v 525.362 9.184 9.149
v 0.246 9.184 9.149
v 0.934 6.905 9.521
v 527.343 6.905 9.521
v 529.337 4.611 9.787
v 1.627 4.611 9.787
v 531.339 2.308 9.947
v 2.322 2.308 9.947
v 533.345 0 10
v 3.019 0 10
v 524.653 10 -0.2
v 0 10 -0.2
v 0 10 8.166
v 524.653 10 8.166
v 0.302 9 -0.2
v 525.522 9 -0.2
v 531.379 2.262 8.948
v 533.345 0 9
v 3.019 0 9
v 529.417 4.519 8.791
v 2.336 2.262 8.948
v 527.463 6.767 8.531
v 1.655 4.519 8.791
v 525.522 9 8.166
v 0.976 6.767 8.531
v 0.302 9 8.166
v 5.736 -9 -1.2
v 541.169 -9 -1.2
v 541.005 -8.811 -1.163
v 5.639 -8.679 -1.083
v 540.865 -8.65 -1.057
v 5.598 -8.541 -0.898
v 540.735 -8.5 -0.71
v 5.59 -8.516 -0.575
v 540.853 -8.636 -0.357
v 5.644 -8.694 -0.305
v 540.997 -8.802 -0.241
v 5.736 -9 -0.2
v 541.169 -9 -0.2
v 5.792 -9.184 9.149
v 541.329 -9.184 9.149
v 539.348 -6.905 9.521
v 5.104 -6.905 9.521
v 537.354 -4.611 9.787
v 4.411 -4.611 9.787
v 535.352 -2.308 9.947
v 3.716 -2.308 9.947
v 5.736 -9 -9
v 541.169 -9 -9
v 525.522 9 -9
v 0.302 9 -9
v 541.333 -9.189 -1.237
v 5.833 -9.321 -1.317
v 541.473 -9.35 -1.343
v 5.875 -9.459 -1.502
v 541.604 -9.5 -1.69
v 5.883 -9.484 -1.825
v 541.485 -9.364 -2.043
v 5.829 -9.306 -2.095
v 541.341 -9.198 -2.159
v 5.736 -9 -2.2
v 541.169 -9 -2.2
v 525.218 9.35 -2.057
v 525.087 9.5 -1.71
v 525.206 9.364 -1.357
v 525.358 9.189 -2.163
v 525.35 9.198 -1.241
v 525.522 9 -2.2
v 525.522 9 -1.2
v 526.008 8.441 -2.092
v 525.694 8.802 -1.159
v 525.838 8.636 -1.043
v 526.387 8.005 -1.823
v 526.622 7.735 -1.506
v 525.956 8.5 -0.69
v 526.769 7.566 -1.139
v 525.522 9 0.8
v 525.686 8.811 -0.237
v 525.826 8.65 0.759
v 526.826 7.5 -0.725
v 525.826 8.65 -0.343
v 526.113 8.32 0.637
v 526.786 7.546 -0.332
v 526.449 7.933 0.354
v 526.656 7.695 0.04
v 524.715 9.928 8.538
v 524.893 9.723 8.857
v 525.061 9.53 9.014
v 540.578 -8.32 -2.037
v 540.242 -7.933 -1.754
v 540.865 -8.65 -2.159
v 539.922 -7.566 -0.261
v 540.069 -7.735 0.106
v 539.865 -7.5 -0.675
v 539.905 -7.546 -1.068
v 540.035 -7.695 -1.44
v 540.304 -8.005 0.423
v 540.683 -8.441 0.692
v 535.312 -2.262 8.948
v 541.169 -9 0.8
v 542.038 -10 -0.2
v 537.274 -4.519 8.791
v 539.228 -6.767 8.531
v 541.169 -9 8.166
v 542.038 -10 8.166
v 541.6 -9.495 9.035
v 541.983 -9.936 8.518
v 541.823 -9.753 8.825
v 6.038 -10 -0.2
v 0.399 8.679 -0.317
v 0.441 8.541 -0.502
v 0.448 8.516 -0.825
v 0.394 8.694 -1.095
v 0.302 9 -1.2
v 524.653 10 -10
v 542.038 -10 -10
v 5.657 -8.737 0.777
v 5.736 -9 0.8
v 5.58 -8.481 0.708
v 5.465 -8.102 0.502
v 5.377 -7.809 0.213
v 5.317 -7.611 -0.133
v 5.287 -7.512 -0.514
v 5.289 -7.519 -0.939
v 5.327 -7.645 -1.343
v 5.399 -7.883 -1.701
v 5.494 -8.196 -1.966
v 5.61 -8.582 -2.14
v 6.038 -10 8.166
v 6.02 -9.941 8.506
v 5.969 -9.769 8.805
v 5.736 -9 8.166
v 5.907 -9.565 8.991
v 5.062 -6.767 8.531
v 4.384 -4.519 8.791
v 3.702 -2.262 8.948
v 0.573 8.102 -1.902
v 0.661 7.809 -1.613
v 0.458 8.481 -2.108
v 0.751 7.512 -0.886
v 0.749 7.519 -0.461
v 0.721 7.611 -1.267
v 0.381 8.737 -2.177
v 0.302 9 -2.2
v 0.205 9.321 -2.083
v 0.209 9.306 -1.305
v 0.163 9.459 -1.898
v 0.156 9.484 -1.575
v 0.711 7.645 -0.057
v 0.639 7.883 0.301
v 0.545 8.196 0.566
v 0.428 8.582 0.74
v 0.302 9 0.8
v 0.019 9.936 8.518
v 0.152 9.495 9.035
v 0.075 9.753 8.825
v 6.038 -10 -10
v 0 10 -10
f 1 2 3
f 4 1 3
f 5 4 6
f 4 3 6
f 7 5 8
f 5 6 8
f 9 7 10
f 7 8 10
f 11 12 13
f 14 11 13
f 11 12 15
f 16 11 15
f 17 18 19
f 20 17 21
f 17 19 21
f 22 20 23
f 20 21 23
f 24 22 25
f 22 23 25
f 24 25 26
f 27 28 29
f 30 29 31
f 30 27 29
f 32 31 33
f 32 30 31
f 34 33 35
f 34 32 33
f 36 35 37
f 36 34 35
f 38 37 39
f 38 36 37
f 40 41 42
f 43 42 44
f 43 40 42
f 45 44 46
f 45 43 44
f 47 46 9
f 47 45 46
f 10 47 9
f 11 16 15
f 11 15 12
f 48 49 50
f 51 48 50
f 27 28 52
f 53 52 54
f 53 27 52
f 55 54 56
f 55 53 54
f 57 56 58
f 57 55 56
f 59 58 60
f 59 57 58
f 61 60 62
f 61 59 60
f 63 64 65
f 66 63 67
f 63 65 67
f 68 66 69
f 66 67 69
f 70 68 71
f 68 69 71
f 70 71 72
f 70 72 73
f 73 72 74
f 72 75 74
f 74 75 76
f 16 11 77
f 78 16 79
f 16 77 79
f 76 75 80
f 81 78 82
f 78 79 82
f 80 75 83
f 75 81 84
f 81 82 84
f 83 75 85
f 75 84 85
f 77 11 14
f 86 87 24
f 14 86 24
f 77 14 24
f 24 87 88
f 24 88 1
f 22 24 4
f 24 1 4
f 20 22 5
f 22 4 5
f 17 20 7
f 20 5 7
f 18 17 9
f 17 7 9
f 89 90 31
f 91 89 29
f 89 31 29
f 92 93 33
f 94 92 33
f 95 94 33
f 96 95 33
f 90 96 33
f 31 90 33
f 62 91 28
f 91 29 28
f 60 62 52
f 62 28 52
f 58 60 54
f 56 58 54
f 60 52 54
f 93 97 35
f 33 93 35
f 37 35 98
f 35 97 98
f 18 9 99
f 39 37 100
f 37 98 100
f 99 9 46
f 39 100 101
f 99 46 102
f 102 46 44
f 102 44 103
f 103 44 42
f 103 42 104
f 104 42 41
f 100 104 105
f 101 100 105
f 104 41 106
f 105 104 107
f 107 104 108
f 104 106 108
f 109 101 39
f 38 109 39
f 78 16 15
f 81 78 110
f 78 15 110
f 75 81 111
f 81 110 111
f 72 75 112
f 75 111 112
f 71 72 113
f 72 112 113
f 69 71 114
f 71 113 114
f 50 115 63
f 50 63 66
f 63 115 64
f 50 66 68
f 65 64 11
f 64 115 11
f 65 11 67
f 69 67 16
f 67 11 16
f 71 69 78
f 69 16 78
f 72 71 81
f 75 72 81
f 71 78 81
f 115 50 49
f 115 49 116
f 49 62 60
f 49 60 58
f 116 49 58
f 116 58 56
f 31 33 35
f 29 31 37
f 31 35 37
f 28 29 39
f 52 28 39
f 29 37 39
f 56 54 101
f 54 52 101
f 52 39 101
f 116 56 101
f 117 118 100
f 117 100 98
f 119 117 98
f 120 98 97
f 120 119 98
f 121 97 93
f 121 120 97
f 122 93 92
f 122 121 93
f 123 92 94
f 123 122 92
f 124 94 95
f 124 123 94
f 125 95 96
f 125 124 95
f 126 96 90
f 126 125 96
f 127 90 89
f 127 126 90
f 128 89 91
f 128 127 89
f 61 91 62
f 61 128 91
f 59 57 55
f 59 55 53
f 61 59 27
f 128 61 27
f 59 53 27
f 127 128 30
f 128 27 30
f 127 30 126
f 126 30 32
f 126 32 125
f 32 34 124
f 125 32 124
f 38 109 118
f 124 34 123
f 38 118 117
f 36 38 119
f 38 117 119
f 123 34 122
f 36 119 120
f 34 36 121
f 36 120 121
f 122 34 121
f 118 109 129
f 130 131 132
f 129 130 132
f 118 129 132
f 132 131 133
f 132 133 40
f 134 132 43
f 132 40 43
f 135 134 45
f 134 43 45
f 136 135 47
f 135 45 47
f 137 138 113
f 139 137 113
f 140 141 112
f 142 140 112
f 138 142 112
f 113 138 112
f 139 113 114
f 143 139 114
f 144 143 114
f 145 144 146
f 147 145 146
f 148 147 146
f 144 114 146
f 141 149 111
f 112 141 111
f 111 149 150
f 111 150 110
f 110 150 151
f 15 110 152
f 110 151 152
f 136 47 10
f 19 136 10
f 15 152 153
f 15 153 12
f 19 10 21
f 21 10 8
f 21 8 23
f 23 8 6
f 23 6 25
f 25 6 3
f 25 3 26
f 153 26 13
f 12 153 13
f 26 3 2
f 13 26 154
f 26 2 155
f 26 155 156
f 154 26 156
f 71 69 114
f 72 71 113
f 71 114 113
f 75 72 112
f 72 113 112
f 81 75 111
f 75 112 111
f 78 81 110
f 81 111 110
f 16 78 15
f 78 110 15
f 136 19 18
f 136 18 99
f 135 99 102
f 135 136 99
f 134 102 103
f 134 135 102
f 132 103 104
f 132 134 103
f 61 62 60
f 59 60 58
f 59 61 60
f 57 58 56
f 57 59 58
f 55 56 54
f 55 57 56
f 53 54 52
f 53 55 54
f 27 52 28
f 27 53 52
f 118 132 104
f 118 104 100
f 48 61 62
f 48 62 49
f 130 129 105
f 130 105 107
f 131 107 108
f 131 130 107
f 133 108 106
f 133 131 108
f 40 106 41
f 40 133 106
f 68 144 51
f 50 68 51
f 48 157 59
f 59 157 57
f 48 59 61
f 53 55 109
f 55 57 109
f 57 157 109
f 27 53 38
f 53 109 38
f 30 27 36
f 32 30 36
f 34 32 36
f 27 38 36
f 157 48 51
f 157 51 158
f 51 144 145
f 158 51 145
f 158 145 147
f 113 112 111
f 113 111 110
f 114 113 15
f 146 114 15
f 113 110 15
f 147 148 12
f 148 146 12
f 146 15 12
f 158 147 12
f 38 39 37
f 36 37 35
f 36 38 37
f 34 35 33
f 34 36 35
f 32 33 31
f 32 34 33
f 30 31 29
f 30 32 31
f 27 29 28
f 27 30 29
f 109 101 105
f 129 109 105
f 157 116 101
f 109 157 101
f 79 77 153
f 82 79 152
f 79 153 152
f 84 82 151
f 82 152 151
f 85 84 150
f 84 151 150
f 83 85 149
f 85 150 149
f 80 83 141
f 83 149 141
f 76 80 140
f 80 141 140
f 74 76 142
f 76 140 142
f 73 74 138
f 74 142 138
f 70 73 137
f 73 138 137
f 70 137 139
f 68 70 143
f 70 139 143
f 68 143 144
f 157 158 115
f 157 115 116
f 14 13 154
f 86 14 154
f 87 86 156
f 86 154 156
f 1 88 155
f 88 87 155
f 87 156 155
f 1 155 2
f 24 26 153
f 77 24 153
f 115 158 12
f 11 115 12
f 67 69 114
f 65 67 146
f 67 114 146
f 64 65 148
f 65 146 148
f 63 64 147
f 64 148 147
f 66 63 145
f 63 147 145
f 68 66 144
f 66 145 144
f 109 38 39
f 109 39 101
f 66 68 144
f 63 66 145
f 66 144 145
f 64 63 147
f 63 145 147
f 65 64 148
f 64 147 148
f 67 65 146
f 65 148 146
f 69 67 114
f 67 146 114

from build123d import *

# Parameters (mm, degrees)
F2_DEPTH      = 1000
F4_DEPTH      = 1000
F8_DEPTH      = 10.001
F8_DEPTH_BACK = 10.001


with BuildPart() as f2:
    # F1 (on Right) → F2 (new body)
    with BuildSketch(Plane.YZ):
        with BuildLine():
            Line((0, -9), (0, -10))
            Line((0, -10), (10, -10))
            Line((10, -10), (10, -0.2))
            Line((10, -0.2), (9, -0.2))
            ThreePointArc((9, -0.2), (8.5, -0.7), (9, -1.2))
            ThreePointArc((9, -1.2), (9.5, -1.7), (9, -2.2))
            Line((9, -2.2), (9, -9))
            Line((9, -9), (0, -9))
        make_face()
    extrude(amount=F2_DEPTH)

    # F5: F2 across plane


with BuildPart() as f4:
    # F3 (on Right) → F4 (new body)
    with BuildSketch(Plane.YZ):
        with BuildLine():
            Line((9, -0.2), (10, -0.2))
            Line((10, -0.2), (10, 8.1663783152))
            ThreePointArc((10, 8.1663783152), (9.7693092582, 8.8052548802), (9.1836734694, 9.1493656277))
            ThreePointArc((9.1836734694, 9.1493656277), (4.6114920912, 9.7868872364), (0, 10))
            Line((0, 10), (0, 9))
            ThreePointArc((0, 9), (4.5192622493, 8.7911494917), (9, 8.1663783152))
            Line((9, 8.1663783152), (9, 0.8))
            ThreePointArc((9, 0.8), (7.5, -0.7), (9, -2.2))
            ThreePointArc((9, -2.2), (9.5, -1.7), (9, -1.2))
            ThreePointArc((9, -1.2), (8.5, -0.7), (9, -0.2))
        make_face()
    extrude(amount=F4_DEPTH)

    # F6: F4 across plane


with BuildPart() as f2_1:
    add(f2.part)
    add(f2.part.mirror(Plane.XZ))


with BuildPart() as f4_1:
    add(f4.part)
    add(f4.part.mirror(Plane.XZ))


with BuildPart() as f8_tool:
    # F7 (on Top) → F8 (new body, two sides)
    with BuildSketch(Plane.XY) as f8_sk:
        Polygon((0, 10), (0, 0), (0, -10), (6.0383560074, -10), align=None)
        Polygon((709.9114181152, 10), (524.652621251, 10), (542.0383560074, -10), (1016.9613361359, -10), (1016.9613361359, 10), align=None)
    extrude(amount=F8_DEPTH)
    extrude(f8_sk.sketch, amount=-F8_DEPTH_BACK)


with BuildPart() as f2_2:
    add(f2_1.part)

    # F8: cut by f8_tool
    add(f8_tool.part, mode=Mode.SUBTRACT)


with BuildPart() as f4_2:
    add(f4_1.part)

    # F8: cut by f8_tool
    add(f8_tool.part, mode=Mode.SUBTRACT)


solid = Compound([f2_2.part, f4_2.part])
